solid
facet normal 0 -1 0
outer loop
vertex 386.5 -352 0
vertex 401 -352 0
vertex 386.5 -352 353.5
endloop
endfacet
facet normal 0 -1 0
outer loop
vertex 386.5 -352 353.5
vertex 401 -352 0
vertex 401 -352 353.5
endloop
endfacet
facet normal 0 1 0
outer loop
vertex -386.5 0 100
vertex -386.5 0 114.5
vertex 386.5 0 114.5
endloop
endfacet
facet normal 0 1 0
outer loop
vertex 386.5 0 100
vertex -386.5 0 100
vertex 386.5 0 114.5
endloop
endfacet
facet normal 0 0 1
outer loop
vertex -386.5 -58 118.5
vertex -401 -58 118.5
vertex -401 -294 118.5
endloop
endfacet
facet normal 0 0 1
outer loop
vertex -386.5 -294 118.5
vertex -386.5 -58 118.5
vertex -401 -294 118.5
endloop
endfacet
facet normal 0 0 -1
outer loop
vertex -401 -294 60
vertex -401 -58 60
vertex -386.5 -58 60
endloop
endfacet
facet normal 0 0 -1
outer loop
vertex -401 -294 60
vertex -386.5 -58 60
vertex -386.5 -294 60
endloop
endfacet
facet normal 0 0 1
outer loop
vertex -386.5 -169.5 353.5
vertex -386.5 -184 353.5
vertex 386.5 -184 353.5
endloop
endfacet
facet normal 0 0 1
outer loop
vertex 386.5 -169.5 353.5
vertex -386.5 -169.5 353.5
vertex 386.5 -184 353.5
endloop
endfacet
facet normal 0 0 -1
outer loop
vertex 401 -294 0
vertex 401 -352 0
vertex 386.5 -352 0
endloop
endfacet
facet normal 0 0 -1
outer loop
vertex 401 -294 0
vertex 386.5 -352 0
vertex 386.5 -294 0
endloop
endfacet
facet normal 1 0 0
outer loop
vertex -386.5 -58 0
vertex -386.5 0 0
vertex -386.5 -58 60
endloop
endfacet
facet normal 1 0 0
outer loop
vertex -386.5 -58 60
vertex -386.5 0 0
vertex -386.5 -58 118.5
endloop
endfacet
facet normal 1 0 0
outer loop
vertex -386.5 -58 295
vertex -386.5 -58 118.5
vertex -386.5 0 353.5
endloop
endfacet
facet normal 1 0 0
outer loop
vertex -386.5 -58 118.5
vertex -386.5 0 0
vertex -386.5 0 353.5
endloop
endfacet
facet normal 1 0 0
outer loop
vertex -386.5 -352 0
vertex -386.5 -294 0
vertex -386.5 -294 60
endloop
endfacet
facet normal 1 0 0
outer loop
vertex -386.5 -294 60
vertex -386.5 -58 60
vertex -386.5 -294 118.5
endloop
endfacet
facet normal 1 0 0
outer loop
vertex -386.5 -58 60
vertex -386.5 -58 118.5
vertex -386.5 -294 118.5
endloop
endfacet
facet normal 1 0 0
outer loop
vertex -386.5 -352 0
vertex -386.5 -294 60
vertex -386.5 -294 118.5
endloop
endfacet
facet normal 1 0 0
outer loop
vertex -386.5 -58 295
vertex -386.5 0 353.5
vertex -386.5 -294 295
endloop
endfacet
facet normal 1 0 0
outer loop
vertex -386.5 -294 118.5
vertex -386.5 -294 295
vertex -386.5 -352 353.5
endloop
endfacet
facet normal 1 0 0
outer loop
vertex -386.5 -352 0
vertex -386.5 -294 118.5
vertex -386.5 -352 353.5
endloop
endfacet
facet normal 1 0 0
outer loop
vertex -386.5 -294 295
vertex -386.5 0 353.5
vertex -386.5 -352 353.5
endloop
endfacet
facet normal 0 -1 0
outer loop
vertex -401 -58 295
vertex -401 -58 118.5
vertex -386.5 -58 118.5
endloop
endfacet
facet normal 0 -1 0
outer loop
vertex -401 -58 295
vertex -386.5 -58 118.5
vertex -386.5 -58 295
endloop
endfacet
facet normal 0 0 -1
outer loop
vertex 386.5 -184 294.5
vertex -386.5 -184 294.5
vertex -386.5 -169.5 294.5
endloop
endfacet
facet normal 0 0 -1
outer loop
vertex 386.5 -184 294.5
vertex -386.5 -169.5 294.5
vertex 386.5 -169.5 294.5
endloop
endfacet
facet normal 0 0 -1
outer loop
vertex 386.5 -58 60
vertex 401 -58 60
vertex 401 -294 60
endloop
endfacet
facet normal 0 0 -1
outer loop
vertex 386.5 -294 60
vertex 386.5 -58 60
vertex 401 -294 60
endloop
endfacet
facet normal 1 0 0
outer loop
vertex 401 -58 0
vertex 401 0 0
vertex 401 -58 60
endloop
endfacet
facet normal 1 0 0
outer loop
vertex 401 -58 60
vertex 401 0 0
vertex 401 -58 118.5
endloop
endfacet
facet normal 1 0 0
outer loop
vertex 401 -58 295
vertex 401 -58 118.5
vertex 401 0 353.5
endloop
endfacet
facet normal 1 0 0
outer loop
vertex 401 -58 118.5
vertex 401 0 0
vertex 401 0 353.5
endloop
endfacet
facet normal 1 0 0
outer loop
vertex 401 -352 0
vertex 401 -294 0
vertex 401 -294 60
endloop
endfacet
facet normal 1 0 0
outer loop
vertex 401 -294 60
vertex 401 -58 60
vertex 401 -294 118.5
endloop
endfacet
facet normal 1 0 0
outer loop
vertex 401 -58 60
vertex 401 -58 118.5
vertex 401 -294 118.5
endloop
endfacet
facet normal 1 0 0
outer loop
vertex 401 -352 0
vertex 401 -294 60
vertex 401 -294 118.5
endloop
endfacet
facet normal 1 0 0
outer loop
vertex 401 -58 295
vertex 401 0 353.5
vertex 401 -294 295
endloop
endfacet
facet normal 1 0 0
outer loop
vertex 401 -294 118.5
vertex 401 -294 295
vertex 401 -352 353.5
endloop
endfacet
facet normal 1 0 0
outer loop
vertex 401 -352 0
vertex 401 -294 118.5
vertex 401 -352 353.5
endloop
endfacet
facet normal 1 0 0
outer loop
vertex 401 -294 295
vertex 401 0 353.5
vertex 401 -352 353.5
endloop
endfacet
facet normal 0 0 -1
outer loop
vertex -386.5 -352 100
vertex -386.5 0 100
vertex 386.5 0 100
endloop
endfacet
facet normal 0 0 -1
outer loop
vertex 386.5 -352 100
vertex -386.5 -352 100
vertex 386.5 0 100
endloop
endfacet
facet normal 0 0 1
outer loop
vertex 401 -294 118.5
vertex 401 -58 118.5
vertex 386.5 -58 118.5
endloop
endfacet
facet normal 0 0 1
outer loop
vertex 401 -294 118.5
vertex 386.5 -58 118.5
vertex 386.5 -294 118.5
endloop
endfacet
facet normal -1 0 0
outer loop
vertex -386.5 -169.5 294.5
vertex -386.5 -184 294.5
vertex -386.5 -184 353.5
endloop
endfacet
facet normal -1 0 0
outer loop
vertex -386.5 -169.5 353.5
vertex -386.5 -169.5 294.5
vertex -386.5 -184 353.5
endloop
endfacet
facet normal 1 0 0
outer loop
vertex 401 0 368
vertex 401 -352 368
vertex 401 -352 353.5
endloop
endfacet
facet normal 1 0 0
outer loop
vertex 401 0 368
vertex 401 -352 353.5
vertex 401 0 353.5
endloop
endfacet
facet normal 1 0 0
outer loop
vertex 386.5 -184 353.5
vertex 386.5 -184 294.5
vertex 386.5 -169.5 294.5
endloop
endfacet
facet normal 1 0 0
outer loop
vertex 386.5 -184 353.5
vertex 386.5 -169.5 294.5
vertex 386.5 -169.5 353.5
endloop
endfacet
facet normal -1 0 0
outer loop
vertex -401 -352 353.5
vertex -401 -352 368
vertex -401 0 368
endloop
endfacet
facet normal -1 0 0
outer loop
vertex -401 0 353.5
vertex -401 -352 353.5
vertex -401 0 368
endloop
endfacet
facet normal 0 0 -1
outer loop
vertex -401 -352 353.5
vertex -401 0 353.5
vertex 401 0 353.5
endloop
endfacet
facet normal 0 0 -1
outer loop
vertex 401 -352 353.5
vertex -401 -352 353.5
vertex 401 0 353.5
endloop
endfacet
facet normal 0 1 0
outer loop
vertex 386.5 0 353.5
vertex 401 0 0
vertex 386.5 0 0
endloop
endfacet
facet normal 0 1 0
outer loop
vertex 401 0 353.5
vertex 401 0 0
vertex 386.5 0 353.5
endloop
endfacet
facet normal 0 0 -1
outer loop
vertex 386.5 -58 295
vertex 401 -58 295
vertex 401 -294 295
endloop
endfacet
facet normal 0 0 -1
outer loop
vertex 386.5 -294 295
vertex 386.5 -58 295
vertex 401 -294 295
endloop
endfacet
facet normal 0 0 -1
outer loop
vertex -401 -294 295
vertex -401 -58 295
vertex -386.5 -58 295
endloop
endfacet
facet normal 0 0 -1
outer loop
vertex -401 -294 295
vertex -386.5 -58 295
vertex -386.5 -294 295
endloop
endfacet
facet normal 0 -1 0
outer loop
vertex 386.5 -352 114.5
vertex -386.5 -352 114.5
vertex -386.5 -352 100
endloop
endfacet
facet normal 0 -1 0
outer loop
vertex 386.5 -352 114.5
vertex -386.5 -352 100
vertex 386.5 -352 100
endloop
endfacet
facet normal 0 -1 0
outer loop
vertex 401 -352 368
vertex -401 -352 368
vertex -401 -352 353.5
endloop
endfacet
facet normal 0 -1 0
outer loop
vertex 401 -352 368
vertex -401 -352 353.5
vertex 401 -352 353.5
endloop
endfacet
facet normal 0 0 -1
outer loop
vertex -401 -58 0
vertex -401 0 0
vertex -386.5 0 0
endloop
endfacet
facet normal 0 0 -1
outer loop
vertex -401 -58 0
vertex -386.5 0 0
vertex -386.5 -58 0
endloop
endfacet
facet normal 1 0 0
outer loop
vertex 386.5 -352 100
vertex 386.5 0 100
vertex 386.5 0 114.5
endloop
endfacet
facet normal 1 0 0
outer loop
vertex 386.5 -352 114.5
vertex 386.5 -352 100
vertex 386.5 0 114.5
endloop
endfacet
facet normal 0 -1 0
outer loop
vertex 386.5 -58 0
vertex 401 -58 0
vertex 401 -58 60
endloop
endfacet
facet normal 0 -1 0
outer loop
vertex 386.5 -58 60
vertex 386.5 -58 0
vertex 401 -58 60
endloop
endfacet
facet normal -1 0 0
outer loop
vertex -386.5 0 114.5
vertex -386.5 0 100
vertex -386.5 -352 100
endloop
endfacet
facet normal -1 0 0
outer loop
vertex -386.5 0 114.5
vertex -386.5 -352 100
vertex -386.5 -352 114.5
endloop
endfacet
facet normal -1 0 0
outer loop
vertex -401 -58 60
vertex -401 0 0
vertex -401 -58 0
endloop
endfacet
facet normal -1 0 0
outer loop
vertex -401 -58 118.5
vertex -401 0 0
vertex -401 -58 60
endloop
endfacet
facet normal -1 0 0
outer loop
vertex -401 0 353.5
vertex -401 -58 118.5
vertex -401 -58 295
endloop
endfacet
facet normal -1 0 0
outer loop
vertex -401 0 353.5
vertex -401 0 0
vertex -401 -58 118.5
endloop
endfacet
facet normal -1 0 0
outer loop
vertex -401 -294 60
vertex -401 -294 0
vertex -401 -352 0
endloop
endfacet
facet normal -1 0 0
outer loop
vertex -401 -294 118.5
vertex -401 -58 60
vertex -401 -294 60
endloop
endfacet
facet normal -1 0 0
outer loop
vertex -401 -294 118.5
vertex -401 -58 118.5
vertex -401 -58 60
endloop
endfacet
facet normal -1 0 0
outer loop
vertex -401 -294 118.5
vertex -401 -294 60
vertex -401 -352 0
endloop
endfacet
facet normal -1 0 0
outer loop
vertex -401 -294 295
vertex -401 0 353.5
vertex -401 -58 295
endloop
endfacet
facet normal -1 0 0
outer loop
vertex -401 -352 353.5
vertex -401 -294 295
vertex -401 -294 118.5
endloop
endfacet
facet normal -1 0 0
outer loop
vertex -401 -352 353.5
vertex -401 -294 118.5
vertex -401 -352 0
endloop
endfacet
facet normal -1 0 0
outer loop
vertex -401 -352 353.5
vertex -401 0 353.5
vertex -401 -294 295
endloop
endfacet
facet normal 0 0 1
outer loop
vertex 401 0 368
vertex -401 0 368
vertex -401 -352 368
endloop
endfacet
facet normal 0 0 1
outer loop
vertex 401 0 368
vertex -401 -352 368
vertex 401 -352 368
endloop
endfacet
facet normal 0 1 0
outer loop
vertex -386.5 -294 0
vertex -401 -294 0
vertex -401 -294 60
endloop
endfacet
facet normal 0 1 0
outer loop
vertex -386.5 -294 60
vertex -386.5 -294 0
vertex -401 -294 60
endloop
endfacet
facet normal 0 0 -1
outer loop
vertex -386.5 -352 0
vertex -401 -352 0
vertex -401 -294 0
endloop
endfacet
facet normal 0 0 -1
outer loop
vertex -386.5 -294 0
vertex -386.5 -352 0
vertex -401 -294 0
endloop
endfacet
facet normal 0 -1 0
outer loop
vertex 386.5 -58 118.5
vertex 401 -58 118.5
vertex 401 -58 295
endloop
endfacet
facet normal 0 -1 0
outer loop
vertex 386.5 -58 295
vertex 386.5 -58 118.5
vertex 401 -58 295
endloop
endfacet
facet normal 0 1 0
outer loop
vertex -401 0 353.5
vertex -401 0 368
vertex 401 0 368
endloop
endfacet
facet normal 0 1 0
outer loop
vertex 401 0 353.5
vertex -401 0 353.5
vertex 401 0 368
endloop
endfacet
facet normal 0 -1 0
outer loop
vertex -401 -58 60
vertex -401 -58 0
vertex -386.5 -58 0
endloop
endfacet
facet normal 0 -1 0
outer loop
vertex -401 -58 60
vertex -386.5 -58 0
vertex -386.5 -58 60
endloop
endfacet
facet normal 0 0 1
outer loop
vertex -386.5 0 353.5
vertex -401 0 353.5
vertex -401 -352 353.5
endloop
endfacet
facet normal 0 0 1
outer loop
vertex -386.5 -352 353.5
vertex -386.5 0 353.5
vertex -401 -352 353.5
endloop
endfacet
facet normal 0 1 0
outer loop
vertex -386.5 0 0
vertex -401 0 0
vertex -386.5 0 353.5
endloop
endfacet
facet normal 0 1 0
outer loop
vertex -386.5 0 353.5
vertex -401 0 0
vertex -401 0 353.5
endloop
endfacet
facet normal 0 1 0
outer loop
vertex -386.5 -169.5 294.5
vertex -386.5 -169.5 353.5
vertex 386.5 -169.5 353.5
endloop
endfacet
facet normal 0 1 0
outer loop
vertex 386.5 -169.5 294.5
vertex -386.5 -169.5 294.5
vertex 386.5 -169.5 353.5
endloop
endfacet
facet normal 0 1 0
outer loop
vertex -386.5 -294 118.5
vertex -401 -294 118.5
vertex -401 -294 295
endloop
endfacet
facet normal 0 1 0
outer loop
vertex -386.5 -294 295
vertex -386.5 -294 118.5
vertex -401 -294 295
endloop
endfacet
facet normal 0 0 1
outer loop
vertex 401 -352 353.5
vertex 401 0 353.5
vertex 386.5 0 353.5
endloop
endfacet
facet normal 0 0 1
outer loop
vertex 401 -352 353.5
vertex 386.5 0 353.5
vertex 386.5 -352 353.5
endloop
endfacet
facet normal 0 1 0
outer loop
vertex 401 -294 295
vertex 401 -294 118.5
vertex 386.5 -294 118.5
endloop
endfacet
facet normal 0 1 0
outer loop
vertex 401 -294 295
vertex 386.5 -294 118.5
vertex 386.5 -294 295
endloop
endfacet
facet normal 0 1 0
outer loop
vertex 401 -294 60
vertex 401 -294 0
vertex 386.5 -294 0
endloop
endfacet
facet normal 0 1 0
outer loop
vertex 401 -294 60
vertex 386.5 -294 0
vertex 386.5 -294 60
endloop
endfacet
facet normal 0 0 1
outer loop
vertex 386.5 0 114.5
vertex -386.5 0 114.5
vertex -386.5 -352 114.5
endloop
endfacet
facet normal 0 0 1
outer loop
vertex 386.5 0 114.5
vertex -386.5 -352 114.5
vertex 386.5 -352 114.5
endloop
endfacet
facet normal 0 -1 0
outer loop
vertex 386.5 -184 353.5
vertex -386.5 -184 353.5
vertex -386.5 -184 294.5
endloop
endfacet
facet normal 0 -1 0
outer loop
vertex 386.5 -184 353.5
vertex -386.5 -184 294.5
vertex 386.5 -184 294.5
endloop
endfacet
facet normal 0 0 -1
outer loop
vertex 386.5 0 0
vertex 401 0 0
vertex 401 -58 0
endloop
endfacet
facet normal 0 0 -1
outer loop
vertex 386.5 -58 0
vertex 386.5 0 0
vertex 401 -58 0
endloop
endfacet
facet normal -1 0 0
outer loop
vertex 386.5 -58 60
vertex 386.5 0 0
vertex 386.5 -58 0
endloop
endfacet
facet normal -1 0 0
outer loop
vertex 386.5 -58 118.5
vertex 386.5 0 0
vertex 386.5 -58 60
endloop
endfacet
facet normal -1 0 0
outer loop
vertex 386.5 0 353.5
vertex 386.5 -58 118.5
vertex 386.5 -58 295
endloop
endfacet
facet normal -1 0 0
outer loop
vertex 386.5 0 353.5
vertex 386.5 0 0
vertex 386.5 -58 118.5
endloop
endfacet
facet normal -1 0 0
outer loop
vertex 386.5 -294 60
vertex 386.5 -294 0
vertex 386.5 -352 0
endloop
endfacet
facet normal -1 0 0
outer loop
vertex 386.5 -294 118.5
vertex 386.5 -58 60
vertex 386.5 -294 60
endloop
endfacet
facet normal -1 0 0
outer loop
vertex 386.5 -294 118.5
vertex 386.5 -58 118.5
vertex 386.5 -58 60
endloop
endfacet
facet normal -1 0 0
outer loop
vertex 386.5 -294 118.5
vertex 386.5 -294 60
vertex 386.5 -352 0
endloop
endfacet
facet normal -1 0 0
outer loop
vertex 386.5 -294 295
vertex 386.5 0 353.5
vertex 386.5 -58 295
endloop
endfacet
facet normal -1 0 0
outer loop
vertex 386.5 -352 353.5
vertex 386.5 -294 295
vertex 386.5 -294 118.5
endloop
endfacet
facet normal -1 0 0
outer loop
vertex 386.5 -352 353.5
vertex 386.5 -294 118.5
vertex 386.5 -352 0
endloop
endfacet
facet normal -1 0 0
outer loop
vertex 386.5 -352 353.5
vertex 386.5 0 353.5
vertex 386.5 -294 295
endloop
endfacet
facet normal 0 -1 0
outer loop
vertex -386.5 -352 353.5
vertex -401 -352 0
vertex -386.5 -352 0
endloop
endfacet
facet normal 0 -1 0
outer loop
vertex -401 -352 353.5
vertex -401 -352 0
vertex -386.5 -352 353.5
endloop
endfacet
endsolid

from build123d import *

# Parameters (mm, degrees)
F2_W      = 802
F2_H      = 352
F5_DEPTH  = 14.5
F6_W      = 58
F6_H      = 353.5
F7_DEPTH  = 14.5
F9_W      = 236
F9_H      = 58.5
F10_DEPTH = 14.5
F15_W     = 773
F15_H     = 59
F16_DEPTH = 14.5
F13_W     = 773
F13_H     = 14.5
F17_DEPTH = 352


with BuildPart() as f5:
    # F2 (on offset) → F5 (new body)
    with BuildSketch(Plane.XY.offset(368)):
        with Locations((0, -176)):
            Rectangle(F2_W, F2_H)
    extrude(amount=-F5_DEPTH)


with BuildPart() as f7:
    # F6 (on line) → F7 (new body)
    with BuildSketch(Plane(origin=(-401, 0, 0), x_dir=(0, -1, 0), z_dir=(-1, 0, 0))):
        with Locations((29, 176.75)):
            Rectangle(F6_W, F6_H)
    extrude(amount=-F7_DEPTH)


with BuildPart() as f8_1:
    # F8: instance of F7
    add(f7.part.mirror(Plane.XZ.offset(176)))


with BuildPart() as f10:
    # F9 (on line) → F10 (new body)
    with BuildSketch(Plane(origin=(-401, 0, 0), x_dir=(0, -1, 0), z_dir=(-1, 0, 0))):
        with Locations((176, 324.25)):
            Rectangle(F9_W, F9_H)
    extrude(amount=-F10_DEPTH)


with BuildPart() as f11_1:
    # F11: copy of F10
    add(f10.part.moved(Location((0, 0, -235))))


with BuildPart() as f7_1:
    add(f7.part)

    add(f8_1.part)  # F12 merges F8_1

    add(f10.part)  # F12 merges F10

    add(f11_1.part)  # F12 merges F11_1
    # F12: F7, F8_1, F10, F11_1 across plane
    add(f7.part.mirror(Plane.YZ))
    add(f8_1.part.mirror(Plane.YZ))
    add(f10.part.mirror(Plane.YZ))
    add(f11_1.part.mirror(Plane.YZ))


with BuildPart() as f16:
    # F15 (on offset) → F16 (new body)
    with BuildSketch(Plane.XZ.offset(184)):
        with Locations((0, 324)):
            Rectangle(F15_W, F15_H)
    extrude(amount=-F16_DEPTH)


with BuildPart() as f17:
    # F13 (on Front) → F17 (new body, through all)
    with BuildSketch(Plane.XZ):
        with Locations((0, 107.25)):
            Rectangle(F13_W, F13_H)
    extrude(amount=F17_DEPTH)


solid = Compound([f5.part, f7_1.part, f16.part, f17.part])
